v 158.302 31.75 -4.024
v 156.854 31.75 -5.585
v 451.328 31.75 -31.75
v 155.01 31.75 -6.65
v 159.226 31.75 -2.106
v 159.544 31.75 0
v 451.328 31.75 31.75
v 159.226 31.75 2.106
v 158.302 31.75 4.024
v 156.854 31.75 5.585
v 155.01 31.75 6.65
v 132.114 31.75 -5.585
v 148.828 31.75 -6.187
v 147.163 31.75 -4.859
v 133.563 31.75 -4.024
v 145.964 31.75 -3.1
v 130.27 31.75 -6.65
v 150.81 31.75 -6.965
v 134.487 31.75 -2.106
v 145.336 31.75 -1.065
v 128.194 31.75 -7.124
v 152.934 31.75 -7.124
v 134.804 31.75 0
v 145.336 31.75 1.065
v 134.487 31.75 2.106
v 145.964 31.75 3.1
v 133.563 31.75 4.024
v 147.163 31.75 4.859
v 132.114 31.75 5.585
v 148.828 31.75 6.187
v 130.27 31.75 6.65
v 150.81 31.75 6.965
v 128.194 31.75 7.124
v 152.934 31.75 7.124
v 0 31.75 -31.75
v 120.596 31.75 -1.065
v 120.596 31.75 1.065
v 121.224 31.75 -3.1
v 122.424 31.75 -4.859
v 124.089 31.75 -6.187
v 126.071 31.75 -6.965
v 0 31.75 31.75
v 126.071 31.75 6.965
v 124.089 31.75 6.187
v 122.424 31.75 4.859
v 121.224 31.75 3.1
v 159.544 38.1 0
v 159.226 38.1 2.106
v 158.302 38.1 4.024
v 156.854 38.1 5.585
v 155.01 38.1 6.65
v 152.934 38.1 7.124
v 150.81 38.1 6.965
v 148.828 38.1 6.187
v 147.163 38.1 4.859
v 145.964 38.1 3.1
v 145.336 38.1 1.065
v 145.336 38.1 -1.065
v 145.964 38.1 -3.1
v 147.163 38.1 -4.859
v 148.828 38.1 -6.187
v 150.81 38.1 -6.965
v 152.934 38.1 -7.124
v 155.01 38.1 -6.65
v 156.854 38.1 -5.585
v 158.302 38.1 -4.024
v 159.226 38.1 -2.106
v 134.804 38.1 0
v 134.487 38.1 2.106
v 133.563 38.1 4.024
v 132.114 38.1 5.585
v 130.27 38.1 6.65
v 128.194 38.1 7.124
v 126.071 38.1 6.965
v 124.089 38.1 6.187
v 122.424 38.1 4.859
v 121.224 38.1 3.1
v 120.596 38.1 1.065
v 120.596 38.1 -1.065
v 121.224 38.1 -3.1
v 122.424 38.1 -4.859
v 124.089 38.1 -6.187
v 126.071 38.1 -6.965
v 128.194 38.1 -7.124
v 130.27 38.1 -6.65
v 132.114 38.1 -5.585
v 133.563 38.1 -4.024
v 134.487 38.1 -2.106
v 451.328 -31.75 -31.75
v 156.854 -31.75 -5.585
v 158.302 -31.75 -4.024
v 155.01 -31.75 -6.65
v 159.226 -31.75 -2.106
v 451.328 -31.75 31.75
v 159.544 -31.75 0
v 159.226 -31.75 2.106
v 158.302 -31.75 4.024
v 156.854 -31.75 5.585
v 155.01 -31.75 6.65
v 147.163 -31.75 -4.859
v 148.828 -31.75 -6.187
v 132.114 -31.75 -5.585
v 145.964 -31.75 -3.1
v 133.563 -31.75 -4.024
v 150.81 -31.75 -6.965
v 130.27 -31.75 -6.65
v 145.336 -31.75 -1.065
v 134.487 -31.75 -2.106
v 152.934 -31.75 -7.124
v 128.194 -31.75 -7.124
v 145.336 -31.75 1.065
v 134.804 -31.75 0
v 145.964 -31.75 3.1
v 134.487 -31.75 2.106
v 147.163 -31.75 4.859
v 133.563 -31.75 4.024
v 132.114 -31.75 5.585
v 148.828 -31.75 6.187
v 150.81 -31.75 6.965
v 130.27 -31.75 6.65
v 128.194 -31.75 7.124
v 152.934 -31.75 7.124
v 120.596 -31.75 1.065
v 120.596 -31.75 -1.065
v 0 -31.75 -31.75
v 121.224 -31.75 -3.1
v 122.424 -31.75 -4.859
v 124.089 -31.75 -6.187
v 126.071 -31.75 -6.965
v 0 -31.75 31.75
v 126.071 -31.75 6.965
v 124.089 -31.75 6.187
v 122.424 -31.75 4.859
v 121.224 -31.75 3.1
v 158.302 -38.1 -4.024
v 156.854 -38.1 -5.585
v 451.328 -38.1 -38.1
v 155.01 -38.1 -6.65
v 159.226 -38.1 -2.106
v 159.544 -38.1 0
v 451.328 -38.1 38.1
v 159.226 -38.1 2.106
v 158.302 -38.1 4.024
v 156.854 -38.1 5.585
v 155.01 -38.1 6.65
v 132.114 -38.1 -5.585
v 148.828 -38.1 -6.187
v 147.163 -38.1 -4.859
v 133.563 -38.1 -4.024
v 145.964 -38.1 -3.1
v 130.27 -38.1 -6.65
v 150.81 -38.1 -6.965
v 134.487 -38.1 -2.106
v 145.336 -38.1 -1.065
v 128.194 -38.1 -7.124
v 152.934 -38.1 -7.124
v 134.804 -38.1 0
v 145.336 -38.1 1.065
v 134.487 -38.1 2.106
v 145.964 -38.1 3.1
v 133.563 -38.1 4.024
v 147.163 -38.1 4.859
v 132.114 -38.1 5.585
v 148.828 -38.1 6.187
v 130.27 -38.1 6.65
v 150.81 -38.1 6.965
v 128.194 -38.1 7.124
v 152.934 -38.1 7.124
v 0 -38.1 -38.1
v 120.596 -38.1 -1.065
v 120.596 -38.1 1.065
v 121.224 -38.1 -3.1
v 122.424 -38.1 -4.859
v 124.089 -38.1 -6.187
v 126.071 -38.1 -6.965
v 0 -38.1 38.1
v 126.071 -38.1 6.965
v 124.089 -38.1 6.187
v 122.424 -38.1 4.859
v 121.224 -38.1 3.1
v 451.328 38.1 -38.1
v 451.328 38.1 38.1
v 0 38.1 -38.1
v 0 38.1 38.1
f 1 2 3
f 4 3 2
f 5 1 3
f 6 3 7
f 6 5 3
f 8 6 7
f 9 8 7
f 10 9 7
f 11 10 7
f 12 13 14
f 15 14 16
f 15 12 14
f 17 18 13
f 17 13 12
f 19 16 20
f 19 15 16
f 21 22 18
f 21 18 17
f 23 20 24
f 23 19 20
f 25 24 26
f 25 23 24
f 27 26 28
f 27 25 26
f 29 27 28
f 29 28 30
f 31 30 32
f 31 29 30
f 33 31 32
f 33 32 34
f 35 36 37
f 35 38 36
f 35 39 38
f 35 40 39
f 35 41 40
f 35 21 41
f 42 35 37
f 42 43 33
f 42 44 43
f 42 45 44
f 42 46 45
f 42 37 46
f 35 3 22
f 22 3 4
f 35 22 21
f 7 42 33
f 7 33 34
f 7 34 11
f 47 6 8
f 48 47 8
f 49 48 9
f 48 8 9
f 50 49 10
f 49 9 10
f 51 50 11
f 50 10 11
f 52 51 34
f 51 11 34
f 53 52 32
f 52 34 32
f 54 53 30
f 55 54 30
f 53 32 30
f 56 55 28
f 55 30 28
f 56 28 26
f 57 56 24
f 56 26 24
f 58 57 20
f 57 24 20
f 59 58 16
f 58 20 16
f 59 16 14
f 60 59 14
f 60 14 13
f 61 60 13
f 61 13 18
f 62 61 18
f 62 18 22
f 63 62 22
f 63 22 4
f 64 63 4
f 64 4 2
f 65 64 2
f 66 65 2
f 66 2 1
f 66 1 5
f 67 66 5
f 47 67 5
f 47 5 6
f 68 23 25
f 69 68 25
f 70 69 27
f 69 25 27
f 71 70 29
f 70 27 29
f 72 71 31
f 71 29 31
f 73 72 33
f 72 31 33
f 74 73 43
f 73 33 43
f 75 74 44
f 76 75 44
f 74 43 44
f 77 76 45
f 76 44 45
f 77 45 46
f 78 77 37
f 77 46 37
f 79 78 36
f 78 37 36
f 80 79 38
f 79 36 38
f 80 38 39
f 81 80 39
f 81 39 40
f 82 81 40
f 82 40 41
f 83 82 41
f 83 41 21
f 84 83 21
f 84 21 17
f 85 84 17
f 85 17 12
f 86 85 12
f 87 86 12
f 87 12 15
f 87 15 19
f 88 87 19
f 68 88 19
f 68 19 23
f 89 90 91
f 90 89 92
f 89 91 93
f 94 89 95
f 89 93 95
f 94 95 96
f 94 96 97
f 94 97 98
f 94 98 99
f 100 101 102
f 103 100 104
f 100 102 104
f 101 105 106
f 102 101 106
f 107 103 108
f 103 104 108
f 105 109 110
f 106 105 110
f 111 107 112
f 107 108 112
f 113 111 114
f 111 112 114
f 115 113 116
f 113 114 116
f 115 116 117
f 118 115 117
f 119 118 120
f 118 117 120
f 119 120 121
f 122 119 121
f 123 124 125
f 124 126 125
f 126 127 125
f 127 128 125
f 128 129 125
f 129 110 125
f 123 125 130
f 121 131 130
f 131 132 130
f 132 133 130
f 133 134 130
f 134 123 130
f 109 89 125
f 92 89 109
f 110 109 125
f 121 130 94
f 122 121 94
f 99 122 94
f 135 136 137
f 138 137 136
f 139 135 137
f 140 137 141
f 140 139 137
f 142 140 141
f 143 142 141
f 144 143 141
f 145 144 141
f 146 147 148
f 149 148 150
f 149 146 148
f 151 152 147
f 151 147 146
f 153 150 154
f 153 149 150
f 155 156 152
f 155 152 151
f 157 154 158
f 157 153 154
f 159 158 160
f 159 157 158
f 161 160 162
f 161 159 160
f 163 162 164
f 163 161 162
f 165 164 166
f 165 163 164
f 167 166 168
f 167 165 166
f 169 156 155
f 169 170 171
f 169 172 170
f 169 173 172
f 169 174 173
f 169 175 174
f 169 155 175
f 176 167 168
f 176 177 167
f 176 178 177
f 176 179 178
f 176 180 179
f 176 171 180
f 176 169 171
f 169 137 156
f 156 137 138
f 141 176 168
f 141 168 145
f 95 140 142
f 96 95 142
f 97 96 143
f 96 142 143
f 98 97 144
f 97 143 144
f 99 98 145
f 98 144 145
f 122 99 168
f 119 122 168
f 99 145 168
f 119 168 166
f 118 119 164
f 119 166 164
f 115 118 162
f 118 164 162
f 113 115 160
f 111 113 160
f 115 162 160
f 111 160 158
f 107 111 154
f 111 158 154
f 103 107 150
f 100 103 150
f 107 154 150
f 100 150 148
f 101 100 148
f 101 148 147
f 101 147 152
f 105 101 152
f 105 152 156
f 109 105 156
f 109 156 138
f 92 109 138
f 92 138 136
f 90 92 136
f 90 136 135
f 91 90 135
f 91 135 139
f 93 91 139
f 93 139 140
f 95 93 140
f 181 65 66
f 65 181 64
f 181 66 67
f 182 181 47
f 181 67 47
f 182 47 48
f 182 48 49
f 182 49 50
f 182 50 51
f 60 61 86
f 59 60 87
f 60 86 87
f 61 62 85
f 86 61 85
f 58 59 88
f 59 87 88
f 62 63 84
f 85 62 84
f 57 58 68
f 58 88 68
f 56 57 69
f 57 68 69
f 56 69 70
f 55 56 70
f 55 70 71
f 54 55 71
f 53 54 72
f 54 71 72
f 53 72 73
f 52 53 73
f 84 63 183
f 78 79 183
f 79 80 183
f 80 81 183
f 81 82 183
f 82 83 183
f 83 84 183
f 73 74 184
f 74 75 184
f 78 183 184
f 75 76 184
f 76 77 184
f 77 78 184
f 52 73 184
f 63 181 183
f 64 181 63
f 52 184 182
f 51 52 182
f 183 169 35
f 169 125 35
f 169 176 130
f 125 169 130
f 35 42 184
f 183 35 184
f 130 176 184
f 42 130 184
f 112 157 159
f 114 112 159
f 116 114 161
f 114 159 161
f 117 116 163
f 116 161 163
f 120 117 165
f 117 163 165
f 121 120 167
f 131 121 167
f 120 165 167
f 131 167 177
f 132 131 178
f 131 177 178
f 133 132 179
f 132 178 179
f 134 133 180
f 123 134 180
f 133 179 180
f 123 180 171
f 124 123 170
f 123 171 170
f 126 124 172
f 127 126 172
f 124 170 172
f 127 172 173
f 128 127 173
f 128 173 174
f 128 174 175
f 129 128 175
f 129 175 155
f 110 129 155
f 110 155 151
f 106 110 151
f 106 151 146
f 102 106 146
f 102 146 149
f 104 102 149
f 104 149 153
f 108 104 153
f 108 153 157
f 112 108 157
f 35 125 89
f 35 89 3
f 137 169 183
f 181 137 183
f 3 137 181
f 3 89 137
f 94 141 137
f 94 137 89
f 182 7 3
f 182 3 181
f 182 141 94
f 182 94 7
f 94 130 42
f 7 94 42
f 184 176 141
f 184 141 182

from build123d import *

# Parameters (mm, degrees)
F1_W     = 76.2
F1_H     = 76.2
F1_W_2   = 63.5
F1_H_2   = 63.5
F2_DEPTH = 451.32752
F3_R     = 7.14375
F4_DEPTH = 76.201


# Not quite as in the source:
# - a variable given as a bare number and used for a length is read in inches; the dataset says mm whatever the document's units were


with BuildPart() as f2:
    # F1 (on Right) → F2 (new body)
    with BuildSketch(Plane.YZ):
        Rectangle(F1_W, F1_H)
        Rectangle(F1_W_2, F1_H_2, mode=Mode.SUBTRACT)
    extrude(amount=F2_DEPTH)

    # F3 (on face) → F4 (cut, through all)
    with BuildSketch(Plane.XZ.offset(38.1)):
        with Locations((152.4, 0)):
            Circle(F3_R)
        with Locations((127.6604, 0)):
            Circle(F3_R)
    extrude(amount=-F4_DEPTH, mode=Mode.SUBTRACT)


solid = f2.part
